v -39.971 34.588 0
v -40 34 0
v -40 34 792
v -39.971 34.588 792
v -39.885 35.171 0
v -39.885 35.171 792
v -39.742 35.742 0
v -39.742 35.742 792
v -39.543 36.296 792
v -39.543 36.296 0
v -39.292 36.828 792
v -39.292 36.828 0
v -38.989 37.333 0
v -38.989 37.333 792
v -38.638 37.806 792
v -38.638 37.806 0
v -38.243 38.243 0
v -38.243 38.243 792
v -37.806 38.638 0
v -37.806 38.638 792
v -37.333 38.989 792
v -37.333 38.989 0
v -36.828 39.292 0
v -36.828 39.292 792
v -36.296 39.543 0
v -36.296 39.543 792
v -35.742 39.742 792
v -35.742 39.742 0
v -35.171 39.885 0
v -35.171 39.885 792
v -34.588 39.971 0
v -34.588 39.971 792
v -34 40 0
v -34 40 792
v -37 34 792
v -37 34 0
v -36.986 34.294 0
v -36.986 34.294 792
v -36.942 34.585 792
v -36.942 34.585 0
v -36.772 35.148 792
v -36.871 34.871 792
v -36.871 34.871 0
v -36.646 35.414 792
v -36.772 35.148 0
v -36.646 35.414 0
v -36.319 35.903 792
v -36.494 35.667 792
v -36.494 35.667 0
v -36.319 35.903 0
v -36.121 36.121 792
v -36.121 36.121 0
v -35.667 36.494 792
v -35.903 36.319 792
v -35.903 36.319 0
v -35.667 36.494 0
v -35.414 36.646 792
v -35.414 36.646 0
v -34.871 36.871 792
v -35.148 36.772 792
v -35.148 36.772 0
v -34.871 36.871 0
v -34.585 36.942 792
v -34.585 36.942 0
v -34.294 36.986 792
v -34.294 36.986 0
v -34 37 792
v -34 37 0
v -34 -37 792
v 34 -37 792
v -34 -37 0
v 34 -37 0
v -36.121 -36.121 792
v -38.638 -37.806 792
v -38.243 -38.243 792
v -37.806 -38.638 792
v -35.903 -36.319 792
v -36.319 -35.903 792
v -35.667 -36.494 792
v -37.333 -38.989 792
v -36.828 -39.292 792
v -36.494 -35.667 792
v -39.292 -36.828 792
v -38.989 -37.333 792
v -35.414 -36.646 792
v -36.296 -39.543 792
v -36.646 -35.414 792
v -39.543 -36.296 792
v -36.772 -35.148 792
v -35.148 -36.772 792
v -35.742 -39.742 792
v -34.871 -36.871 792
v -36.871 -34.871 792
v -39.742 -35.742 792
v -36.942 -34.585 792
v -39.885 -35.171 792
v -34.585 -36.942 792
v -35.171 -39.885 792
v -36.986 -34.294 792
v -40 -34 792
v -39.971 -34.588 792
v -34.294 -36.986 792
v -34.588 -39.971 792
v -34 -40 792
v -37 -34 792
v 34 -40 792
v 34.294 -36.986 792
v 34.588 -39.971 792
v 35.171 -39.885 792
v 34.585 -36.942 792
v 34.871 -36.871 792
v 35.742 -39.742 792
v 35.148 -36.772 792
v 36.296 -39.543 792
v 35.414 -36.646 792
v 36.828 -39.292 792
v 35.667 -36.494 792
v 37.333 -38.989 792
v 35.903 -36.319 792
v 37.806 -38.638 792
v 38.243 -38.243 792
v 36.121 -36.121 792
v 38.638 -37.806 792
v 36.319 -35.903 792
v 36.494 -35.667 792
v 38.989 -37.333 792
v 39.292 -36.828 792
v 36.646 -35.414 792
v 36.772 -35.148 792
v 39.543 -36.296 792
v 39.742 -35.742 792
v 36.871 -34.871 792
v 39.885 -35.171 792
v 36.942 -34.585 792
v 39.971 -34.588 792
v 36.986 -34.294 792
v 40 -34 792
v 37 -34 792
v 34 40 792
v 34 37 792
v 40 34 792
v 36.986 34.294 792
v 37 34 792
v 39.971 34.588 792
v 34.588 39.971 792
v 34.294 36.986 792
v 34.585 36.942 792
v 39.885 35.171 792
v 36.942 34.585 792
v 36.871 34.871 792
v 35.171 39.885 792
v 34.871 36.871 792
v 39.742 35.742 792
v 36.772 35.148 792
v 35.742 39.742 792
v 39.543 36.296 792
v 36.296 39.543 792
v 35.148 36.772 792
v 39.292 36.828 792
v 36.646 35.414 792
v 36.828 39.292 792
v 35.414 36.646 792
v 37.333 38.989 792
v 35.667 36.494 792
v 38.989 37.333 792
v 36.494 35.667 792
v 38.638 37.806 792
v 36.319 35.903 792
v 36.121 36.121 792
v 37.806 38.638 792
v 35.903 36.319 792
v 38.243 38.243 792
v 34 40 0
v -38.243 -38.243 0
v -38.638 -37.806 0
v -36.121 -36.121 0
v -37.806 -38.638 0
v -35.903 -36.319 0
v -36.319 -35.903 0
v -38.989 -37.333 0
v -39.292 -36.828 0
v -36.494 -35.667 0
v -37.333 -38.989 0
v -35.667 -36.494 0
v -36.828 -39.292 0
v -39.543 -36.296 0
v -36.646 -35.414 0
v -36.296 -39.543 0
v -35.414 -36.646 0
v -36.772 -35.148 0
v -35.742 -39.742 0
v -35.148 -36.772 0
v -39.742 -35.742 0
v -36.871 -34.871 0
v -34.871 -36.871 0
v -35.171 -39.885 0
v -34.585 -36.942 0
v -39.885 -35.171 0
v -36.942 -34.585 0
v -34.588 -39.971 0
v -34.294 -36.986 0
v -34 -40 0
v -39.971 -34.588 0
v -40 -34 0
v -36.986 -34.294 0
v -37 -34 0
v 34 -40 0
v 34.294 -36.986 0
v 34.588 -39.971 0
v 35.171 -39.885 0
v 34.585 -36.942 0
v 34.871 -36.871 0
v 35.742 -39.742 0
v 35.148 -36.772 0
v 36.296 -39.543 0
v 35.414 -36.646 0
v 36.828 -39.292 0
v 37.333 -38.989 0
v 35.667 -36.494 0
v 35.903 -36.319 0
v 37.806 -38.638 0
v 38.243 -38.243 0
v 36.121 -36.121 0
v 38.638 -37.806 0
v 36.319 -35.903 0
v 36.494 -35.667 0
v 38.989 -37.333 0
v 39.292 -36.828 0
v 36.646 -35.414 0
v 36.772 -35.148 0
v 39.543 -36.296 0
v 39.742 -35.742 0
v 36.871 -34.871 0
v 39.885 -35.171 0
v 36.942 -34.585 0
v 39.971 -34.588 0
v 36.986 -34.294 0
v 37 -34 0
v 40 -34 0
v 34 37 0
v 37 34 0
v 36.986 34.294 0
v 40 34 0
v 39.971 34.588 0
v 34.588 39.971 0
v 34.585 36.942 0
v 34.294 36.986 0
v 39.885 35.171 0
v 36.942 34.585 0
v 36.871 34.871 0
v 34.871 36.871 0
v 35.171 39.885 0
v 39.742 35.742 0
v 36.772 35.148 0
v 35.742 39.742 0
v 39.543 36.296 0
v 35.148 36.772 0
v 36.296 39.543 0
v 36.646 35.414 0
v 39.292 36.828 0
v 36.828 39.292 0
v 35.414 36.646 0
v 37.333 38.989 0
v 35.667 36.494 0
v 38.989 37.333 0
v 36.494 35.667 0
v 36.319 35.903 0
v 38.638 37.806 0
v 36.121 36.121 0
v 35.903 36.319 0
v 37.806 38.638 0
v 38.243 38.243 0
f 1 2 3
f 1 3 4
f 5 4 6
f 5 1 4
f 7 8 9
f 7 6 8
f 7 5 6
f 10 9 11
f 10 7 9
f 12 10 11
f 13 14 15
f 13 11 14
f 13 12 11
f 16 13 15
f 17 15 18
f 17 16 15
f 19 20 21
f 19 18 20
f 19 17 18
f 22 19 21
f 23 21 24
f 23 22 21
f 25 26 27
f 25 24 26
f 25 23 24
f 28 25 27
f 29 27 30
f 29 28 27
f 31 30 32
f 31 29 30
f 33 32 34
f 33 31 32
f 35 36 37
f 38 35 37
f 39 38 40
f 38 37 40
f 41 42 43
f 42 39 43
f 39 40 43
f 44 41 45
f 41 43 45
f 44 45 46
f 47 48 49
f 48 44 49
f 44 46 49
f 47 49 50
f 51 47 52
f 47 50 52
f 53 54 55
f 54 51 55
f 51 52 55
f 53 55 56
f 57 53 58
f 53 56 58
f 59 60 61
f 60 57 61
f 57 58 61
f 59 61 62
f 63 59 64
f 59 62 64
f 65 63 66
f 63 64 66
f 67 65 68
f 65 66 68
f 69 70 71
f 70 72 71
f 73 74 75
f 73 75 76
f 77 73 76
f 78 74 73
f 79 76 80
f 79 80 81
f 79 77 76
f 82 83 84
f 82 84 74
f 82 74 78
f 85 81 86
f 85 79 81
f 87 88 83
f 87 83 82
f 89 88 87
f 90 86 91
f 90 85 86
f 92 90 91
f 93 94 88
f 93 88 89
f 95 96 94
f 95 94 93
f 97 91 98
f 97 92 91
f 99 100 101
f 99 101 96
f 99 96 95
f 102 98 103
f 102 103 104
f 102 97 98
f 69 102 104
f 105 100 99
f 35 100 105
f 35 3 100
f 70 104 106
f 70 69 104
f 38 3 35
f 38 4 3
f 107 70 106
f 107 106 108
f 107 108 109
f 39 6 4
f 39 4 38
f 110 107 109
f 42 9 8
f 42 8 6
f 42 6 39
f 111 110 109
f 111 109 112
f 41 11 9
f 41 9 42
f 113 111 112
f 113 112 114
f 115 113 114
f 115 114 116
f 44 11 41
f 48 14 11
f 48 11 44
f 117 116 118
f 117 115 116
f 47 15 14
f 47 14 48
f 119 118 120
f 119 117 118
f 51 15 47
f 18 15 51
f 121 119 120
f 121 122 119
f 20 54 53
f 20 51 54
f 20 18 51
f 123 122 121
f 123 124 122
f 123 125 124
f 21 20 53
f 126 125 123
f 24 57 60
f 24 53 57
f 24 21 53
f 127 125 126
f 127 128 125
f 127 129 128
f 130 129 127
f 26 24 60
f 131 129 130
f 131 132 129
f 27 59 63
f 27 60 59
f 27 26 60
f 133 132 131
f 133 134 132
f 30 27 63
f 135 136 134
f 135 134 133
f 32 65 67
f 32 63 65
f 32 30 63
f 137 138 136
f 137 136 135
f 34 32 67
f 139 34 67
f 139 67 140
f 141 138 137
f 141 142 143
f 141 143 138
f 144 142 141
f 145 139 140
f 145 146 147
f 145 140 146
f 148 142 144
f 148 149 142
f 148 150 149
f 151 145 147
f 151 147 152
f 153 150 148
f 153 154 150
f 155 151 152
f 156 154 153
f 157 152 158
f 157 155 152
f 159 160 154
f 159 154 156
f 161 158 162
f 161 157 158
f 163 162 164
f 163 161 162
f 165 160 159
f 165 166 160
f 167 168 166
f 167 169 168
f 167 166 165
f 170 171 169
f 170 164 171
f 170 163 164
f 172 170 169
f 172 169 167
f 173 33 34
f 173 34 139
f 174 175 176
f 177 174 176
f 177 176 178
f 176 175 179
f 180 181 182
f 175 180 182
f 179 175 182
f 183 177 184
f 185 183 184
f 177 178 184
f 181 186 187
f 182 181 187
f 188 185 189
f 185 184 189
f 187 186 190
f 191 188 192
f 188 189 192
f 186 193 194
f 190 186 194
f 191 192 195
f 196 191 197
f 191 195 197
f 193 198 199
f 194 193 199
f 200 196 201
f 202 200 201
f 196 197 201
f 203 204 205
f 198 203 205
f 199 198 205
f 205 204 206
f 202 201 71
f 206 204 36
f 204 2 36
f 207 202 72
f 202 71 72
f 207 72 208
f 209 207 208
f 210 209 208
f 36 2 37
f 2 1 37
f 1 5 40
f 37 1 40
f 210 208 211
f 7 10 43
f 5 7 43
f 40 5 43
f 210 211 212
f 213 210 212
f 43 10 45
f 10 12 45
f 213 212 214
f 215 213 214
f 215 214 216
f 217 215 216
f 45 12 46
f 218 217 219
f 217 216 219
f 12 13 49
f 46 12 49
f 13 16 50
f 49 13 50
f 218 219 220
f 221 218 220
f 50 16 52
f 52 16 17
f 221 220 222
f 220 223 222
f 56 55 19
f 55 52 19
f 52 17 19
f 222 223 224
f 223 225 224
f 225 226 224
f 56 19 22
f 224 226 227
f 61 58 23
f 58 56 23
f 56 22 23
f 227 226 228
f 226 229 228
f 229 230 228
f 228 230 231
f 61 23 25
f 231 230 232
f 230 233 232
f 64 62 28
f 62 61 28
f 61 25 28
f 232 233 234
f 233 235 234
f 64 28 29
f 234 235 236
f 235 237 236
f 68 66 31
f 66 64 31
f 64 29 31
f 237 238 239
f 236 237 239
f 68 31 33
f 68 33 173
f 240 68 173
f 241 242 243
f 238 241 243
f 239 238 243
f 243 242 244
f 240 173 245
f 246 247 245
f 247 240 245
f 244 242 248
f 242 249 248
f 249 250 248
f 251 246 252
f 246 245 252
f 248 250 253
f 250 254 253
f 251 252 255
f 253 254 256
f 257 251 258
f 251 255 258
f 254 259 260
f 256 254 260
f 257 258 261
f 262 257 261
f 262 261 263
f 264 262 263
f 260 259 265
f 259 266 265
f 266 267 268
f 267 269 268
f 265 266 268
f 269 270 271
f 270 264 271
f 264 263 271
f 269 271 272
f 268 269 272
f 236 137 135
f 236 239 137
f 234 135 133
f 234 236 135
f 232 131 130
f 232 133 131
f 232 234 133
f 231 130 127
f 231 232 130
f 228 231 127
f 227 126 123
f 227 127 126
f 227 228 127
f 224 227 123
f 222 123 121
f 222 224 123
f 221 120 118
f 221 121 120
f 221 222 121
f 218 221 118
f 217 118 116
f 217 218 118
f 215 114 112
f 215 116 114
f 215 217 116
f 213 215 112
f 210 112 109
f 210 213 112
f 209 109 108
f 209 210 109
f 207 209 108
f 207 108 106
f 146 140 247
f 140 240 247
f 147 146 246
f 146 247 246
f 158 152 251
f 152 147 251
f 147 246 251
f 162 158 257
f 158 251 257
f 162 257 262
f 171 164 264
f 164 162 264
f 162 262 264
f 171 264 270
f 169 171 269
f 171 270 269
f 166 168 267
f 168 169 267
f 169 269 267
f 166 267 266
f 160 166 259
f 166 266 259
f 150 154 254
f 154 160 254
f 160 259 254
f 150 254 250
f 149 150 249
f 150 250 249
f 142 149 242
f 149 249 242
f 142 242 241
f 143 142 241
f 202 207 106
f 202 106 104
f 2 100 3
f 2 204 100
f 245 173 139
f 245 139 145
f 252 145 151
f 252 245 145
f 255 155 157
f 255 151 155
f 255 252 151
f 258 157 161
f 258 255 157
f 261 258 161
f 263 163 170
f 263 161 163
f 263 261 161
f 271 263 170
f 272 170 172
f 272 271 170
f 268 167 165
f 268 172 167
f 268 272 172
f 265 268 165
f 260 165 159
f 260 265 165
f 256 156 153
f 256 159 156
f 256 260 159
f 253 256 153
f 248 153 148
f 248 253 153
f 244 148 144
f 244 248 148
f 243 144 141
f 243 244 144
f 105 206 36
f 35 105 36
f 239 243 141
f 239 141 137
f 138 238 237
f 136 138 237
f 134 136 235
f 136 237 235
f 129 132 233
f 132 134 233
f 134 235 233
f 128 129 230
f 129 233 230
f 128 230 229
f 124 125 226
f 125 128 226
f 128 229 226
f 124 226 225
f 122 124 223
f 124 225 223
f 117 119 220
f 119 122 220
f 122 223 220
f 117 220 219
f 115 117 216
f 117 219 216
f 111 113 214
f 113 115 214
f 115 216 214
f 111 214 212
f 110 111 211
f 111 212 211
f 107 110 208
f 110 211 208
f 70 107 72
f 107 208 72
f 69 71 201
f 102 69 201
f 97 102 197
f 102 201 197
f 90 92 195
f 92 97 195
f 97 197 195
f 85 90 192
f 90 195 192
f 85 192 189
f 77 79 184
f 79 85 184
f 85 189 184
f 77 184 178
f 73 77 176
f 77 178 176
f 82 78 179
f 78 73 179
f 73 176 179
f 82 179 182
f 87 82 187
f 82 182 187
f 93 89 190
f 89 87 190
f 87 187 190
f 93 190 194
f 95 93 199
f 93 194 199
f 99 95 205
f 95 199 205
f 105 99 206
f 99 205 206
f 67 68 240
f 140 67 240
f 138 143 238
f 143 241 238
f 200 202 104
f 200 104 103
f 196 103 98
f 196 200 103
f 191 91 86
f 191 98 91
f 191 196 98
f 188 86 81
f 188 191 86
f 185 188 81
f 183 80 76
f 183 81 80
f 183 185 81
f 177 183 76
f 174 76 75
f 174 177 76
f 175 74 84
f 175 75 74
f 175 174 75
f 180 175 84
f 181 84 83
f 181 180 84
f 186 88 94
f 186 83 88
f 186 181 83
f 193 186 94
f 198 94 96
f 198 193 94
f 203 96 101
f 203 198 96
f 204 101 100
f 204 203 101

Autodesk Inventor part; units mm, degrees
ref_plane "YZ Plane" through (0, 0, 0) normal (1, 0, 0) x (0, 1, 0)
ref_plane "Start Plane" through (0, 0, 0) normal (0, 0, 1) x (1, 0, 0)
ref_plane "End Plane" through (0, 0, 792) normal (0, 0, 1) x (1, 0, 0)
sketch "Sketch" plane through (0, 0, 0) normal (0, 0, 1) x (1, 0, 0)
  line L0 (-40, -34) -> (-40, 34)
  line L1 (-34, 40) -> (34, 40)
  line L2 (40, 34) -> (40, -34)
  line L3 (34, -40) -> (-34, -40)
  arc A0 (-40, -34) -> (-34, -40) centre (-34, -34) ccw
  arc A1 (40, 34) -> (34, 40) centre (34, 34) ccw
  arc A2 (-34, 40) -> (-40, 34) centre (-34, 34) ccw
  arc A3 (34, -40) -> (40, -34) centre (34, -34) ccw
  arc A4 (-34, 37) -> (-37, 34) centre (-34, 34) ccw
  line L4 (-34, 37) -> (34, 37)
  arc A5 (37, 34) -> (34, 37) centre (34, 34) ccw
  line L5 (37, 34) -> (37, -34)
  arc A6 (34, -37) -> (37, -34) centre (34, -34) ccw
  line L6 (34, -37) -> (-34, -37)
  arc A7 (-37, -34) -> (-34, -37) centre (-34, -34) ccw
  line L7 (-37, -34) -> (-37, 34)
  line L8 (0, 57.7397) -> (0, -57.7397) construction
  line L9 (-57.7397, 0) -> (57.7397, 0) construction
  dimension "d7" = 6
  dimension "d9" = 80
  dimension "d11" = 80
  dimension "d12" = 3
  dimension "d15" = 40
  dimension "d16" = 40
extrude "Body" add sketch "Sketch" along normal blind 792 from surface at 0
sketch "Sketch3" plane through (0, 0, 0) normal (0, 0, 1) x (1, 0, 0)
  line L0 (0, 0) -> (10, 0)
ref_plane "Work Plane3" through (0, 0, 0) normal (0, -1, 0) x (1, 0, 0)
sketch "Sketch4" plane through (0, 0, 0) normal (0, -1, 0) x (1, 0, 0)
  line L0 (-2, 0) -> (12, 0) projected
  line L1 (-2, 792) -> (12, 792) projected
  dimension "d18" = 792
equation "\"d7\" = G_IR"
equation "\"d9\" = G_W"
equation "\"d11\" = G_H"
equation "\"d12\" = G_T"
equation "\"d15\" = 0.5 * d9"
equation "\"d16\" = 0.5 * d11"
equation "\"d3\" = G_L"
equation "\"G_W\" = 80"
equation "\"G_H\" = 80"
equation "\"G_T\" = 3"
equation "\"G_IR\" = 6"
equation "\"G_L\" = d18"
equation "\"G_OFFSET_START\" = 0"
equation "\"G_OFFSET_END\" = 0"
equation "\"d14\" = G_OFFSET_END + B_L"
equation "\"B_L\" = 792"
properties part number "ISO 10799-2 - 80x80x3 - 792" material "Steel, Mild"
